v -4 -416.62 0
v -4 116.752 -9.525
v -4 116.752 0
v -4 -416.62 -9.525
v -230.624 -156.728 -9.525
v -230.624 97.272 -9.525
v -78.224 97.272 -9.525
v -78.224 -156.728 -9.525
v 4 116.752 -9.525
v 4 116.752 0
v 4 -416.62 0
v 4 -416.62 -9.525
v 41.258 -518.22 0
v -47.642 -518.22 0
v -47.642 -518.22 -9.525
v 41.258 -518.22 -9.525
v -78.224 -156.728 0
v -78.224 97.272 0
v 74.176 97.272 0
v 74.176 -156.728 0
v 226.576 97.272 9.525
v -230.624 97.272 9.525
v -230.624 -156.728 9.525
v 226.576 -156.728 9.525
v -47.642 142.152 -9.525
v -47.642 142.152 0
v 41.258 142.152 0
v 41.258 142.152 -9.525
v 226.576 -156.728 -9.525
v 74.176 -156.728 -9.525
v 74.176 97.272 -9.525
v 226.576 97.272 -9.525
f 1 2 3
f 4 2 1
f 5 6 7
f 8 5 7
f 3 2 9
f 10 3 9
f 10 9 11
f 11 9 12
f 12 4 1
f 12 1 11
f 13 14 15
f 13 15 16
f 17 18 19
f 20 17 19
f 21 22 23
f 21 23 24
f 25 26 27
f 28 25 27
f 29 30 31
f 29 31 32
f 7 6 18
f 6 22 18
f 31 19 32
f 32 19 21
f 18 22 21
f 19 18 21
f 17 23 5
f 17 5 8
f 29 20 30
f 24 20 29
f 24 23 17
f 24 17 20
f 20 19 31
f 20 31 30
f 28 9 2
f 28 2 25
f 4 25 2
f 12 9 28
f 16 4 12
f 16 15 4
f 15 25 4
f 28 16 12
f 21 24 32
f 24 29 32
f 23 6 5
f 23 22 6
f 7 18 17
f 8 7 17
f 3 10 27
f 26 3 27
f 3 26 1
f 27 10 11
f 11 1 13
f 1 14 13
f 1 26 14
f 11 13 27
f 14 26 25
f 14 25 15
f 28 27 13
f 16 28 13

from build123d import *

# Parameters (mm, degrees)
F0_W     = 457.2
F0_H     = 254
F1_DEPTH = 9.525
F2_W     = 152.4
F2_H     = 254
F3_DEPTH = 9.525
F4_W     = 88.9
F4_H     = 660.3725897312
F5_DEPTH = 9.525
F6_W     = 8
F6_H     = 533.3725897312
F7_DEPTH = 9.525


# Not quite as in the source:
# - a length typed as a fraction of an inch, garbled in the dataset ("3 / 203.2 mm" for 3/8 in), is restored


with BuildPart() as f1:
    # F0 (on Top) → F1 (new body)
    with BuildSketch(Plane.XY):
        with Locations((-2.023909241, -29.7276111473)):
            Rectangle(F0_W, F0_H)
    extrude(amount=F1_DEPTH)

    # F2 (on face) → F3 (join)
    with BuildSketch(Plane(origin=(0, 0, 0), x_dir=(1, 0, 0), z_dir=(0, 0, -1))):
        with Locations((-154.423909241, 29.7276111473)):
            Rectangle(F2_W, F2_H)
        with Locations((150.376090759, 29.7276111473)):
            Rectangle(F2_W, F2_H)
    extrude(amount=F3_DEPTH)


with BuildPart() as f5:
    # F4 (on face) → F5 (new body)
    with BuildSketch(Plane(origin=(0, 0, 0), x_dir=(1, 0, 0), z_dir=(0, 0, -1))):
        with Locations((-3.192269256, 188.0340722744)):
            Rectangle(F4_W, F4_H)
    extrude(amount=F5_DEPTH)

    # F6 (on face) → F7 (cut, through all)
    with BuildSketch(Plane(origin=(0, 0, -9.525), x_dir=(1, 0, 0), z_dir=(0, 0, -1))):
        with Locations((0, 149.9340722744)):
            Rectangle(F6_W, F6_H)
    extrude(amount=-F7_DEPTH, mode=Mode.SUBTRACT)


solid = Compound([f1.part, f5.part])
